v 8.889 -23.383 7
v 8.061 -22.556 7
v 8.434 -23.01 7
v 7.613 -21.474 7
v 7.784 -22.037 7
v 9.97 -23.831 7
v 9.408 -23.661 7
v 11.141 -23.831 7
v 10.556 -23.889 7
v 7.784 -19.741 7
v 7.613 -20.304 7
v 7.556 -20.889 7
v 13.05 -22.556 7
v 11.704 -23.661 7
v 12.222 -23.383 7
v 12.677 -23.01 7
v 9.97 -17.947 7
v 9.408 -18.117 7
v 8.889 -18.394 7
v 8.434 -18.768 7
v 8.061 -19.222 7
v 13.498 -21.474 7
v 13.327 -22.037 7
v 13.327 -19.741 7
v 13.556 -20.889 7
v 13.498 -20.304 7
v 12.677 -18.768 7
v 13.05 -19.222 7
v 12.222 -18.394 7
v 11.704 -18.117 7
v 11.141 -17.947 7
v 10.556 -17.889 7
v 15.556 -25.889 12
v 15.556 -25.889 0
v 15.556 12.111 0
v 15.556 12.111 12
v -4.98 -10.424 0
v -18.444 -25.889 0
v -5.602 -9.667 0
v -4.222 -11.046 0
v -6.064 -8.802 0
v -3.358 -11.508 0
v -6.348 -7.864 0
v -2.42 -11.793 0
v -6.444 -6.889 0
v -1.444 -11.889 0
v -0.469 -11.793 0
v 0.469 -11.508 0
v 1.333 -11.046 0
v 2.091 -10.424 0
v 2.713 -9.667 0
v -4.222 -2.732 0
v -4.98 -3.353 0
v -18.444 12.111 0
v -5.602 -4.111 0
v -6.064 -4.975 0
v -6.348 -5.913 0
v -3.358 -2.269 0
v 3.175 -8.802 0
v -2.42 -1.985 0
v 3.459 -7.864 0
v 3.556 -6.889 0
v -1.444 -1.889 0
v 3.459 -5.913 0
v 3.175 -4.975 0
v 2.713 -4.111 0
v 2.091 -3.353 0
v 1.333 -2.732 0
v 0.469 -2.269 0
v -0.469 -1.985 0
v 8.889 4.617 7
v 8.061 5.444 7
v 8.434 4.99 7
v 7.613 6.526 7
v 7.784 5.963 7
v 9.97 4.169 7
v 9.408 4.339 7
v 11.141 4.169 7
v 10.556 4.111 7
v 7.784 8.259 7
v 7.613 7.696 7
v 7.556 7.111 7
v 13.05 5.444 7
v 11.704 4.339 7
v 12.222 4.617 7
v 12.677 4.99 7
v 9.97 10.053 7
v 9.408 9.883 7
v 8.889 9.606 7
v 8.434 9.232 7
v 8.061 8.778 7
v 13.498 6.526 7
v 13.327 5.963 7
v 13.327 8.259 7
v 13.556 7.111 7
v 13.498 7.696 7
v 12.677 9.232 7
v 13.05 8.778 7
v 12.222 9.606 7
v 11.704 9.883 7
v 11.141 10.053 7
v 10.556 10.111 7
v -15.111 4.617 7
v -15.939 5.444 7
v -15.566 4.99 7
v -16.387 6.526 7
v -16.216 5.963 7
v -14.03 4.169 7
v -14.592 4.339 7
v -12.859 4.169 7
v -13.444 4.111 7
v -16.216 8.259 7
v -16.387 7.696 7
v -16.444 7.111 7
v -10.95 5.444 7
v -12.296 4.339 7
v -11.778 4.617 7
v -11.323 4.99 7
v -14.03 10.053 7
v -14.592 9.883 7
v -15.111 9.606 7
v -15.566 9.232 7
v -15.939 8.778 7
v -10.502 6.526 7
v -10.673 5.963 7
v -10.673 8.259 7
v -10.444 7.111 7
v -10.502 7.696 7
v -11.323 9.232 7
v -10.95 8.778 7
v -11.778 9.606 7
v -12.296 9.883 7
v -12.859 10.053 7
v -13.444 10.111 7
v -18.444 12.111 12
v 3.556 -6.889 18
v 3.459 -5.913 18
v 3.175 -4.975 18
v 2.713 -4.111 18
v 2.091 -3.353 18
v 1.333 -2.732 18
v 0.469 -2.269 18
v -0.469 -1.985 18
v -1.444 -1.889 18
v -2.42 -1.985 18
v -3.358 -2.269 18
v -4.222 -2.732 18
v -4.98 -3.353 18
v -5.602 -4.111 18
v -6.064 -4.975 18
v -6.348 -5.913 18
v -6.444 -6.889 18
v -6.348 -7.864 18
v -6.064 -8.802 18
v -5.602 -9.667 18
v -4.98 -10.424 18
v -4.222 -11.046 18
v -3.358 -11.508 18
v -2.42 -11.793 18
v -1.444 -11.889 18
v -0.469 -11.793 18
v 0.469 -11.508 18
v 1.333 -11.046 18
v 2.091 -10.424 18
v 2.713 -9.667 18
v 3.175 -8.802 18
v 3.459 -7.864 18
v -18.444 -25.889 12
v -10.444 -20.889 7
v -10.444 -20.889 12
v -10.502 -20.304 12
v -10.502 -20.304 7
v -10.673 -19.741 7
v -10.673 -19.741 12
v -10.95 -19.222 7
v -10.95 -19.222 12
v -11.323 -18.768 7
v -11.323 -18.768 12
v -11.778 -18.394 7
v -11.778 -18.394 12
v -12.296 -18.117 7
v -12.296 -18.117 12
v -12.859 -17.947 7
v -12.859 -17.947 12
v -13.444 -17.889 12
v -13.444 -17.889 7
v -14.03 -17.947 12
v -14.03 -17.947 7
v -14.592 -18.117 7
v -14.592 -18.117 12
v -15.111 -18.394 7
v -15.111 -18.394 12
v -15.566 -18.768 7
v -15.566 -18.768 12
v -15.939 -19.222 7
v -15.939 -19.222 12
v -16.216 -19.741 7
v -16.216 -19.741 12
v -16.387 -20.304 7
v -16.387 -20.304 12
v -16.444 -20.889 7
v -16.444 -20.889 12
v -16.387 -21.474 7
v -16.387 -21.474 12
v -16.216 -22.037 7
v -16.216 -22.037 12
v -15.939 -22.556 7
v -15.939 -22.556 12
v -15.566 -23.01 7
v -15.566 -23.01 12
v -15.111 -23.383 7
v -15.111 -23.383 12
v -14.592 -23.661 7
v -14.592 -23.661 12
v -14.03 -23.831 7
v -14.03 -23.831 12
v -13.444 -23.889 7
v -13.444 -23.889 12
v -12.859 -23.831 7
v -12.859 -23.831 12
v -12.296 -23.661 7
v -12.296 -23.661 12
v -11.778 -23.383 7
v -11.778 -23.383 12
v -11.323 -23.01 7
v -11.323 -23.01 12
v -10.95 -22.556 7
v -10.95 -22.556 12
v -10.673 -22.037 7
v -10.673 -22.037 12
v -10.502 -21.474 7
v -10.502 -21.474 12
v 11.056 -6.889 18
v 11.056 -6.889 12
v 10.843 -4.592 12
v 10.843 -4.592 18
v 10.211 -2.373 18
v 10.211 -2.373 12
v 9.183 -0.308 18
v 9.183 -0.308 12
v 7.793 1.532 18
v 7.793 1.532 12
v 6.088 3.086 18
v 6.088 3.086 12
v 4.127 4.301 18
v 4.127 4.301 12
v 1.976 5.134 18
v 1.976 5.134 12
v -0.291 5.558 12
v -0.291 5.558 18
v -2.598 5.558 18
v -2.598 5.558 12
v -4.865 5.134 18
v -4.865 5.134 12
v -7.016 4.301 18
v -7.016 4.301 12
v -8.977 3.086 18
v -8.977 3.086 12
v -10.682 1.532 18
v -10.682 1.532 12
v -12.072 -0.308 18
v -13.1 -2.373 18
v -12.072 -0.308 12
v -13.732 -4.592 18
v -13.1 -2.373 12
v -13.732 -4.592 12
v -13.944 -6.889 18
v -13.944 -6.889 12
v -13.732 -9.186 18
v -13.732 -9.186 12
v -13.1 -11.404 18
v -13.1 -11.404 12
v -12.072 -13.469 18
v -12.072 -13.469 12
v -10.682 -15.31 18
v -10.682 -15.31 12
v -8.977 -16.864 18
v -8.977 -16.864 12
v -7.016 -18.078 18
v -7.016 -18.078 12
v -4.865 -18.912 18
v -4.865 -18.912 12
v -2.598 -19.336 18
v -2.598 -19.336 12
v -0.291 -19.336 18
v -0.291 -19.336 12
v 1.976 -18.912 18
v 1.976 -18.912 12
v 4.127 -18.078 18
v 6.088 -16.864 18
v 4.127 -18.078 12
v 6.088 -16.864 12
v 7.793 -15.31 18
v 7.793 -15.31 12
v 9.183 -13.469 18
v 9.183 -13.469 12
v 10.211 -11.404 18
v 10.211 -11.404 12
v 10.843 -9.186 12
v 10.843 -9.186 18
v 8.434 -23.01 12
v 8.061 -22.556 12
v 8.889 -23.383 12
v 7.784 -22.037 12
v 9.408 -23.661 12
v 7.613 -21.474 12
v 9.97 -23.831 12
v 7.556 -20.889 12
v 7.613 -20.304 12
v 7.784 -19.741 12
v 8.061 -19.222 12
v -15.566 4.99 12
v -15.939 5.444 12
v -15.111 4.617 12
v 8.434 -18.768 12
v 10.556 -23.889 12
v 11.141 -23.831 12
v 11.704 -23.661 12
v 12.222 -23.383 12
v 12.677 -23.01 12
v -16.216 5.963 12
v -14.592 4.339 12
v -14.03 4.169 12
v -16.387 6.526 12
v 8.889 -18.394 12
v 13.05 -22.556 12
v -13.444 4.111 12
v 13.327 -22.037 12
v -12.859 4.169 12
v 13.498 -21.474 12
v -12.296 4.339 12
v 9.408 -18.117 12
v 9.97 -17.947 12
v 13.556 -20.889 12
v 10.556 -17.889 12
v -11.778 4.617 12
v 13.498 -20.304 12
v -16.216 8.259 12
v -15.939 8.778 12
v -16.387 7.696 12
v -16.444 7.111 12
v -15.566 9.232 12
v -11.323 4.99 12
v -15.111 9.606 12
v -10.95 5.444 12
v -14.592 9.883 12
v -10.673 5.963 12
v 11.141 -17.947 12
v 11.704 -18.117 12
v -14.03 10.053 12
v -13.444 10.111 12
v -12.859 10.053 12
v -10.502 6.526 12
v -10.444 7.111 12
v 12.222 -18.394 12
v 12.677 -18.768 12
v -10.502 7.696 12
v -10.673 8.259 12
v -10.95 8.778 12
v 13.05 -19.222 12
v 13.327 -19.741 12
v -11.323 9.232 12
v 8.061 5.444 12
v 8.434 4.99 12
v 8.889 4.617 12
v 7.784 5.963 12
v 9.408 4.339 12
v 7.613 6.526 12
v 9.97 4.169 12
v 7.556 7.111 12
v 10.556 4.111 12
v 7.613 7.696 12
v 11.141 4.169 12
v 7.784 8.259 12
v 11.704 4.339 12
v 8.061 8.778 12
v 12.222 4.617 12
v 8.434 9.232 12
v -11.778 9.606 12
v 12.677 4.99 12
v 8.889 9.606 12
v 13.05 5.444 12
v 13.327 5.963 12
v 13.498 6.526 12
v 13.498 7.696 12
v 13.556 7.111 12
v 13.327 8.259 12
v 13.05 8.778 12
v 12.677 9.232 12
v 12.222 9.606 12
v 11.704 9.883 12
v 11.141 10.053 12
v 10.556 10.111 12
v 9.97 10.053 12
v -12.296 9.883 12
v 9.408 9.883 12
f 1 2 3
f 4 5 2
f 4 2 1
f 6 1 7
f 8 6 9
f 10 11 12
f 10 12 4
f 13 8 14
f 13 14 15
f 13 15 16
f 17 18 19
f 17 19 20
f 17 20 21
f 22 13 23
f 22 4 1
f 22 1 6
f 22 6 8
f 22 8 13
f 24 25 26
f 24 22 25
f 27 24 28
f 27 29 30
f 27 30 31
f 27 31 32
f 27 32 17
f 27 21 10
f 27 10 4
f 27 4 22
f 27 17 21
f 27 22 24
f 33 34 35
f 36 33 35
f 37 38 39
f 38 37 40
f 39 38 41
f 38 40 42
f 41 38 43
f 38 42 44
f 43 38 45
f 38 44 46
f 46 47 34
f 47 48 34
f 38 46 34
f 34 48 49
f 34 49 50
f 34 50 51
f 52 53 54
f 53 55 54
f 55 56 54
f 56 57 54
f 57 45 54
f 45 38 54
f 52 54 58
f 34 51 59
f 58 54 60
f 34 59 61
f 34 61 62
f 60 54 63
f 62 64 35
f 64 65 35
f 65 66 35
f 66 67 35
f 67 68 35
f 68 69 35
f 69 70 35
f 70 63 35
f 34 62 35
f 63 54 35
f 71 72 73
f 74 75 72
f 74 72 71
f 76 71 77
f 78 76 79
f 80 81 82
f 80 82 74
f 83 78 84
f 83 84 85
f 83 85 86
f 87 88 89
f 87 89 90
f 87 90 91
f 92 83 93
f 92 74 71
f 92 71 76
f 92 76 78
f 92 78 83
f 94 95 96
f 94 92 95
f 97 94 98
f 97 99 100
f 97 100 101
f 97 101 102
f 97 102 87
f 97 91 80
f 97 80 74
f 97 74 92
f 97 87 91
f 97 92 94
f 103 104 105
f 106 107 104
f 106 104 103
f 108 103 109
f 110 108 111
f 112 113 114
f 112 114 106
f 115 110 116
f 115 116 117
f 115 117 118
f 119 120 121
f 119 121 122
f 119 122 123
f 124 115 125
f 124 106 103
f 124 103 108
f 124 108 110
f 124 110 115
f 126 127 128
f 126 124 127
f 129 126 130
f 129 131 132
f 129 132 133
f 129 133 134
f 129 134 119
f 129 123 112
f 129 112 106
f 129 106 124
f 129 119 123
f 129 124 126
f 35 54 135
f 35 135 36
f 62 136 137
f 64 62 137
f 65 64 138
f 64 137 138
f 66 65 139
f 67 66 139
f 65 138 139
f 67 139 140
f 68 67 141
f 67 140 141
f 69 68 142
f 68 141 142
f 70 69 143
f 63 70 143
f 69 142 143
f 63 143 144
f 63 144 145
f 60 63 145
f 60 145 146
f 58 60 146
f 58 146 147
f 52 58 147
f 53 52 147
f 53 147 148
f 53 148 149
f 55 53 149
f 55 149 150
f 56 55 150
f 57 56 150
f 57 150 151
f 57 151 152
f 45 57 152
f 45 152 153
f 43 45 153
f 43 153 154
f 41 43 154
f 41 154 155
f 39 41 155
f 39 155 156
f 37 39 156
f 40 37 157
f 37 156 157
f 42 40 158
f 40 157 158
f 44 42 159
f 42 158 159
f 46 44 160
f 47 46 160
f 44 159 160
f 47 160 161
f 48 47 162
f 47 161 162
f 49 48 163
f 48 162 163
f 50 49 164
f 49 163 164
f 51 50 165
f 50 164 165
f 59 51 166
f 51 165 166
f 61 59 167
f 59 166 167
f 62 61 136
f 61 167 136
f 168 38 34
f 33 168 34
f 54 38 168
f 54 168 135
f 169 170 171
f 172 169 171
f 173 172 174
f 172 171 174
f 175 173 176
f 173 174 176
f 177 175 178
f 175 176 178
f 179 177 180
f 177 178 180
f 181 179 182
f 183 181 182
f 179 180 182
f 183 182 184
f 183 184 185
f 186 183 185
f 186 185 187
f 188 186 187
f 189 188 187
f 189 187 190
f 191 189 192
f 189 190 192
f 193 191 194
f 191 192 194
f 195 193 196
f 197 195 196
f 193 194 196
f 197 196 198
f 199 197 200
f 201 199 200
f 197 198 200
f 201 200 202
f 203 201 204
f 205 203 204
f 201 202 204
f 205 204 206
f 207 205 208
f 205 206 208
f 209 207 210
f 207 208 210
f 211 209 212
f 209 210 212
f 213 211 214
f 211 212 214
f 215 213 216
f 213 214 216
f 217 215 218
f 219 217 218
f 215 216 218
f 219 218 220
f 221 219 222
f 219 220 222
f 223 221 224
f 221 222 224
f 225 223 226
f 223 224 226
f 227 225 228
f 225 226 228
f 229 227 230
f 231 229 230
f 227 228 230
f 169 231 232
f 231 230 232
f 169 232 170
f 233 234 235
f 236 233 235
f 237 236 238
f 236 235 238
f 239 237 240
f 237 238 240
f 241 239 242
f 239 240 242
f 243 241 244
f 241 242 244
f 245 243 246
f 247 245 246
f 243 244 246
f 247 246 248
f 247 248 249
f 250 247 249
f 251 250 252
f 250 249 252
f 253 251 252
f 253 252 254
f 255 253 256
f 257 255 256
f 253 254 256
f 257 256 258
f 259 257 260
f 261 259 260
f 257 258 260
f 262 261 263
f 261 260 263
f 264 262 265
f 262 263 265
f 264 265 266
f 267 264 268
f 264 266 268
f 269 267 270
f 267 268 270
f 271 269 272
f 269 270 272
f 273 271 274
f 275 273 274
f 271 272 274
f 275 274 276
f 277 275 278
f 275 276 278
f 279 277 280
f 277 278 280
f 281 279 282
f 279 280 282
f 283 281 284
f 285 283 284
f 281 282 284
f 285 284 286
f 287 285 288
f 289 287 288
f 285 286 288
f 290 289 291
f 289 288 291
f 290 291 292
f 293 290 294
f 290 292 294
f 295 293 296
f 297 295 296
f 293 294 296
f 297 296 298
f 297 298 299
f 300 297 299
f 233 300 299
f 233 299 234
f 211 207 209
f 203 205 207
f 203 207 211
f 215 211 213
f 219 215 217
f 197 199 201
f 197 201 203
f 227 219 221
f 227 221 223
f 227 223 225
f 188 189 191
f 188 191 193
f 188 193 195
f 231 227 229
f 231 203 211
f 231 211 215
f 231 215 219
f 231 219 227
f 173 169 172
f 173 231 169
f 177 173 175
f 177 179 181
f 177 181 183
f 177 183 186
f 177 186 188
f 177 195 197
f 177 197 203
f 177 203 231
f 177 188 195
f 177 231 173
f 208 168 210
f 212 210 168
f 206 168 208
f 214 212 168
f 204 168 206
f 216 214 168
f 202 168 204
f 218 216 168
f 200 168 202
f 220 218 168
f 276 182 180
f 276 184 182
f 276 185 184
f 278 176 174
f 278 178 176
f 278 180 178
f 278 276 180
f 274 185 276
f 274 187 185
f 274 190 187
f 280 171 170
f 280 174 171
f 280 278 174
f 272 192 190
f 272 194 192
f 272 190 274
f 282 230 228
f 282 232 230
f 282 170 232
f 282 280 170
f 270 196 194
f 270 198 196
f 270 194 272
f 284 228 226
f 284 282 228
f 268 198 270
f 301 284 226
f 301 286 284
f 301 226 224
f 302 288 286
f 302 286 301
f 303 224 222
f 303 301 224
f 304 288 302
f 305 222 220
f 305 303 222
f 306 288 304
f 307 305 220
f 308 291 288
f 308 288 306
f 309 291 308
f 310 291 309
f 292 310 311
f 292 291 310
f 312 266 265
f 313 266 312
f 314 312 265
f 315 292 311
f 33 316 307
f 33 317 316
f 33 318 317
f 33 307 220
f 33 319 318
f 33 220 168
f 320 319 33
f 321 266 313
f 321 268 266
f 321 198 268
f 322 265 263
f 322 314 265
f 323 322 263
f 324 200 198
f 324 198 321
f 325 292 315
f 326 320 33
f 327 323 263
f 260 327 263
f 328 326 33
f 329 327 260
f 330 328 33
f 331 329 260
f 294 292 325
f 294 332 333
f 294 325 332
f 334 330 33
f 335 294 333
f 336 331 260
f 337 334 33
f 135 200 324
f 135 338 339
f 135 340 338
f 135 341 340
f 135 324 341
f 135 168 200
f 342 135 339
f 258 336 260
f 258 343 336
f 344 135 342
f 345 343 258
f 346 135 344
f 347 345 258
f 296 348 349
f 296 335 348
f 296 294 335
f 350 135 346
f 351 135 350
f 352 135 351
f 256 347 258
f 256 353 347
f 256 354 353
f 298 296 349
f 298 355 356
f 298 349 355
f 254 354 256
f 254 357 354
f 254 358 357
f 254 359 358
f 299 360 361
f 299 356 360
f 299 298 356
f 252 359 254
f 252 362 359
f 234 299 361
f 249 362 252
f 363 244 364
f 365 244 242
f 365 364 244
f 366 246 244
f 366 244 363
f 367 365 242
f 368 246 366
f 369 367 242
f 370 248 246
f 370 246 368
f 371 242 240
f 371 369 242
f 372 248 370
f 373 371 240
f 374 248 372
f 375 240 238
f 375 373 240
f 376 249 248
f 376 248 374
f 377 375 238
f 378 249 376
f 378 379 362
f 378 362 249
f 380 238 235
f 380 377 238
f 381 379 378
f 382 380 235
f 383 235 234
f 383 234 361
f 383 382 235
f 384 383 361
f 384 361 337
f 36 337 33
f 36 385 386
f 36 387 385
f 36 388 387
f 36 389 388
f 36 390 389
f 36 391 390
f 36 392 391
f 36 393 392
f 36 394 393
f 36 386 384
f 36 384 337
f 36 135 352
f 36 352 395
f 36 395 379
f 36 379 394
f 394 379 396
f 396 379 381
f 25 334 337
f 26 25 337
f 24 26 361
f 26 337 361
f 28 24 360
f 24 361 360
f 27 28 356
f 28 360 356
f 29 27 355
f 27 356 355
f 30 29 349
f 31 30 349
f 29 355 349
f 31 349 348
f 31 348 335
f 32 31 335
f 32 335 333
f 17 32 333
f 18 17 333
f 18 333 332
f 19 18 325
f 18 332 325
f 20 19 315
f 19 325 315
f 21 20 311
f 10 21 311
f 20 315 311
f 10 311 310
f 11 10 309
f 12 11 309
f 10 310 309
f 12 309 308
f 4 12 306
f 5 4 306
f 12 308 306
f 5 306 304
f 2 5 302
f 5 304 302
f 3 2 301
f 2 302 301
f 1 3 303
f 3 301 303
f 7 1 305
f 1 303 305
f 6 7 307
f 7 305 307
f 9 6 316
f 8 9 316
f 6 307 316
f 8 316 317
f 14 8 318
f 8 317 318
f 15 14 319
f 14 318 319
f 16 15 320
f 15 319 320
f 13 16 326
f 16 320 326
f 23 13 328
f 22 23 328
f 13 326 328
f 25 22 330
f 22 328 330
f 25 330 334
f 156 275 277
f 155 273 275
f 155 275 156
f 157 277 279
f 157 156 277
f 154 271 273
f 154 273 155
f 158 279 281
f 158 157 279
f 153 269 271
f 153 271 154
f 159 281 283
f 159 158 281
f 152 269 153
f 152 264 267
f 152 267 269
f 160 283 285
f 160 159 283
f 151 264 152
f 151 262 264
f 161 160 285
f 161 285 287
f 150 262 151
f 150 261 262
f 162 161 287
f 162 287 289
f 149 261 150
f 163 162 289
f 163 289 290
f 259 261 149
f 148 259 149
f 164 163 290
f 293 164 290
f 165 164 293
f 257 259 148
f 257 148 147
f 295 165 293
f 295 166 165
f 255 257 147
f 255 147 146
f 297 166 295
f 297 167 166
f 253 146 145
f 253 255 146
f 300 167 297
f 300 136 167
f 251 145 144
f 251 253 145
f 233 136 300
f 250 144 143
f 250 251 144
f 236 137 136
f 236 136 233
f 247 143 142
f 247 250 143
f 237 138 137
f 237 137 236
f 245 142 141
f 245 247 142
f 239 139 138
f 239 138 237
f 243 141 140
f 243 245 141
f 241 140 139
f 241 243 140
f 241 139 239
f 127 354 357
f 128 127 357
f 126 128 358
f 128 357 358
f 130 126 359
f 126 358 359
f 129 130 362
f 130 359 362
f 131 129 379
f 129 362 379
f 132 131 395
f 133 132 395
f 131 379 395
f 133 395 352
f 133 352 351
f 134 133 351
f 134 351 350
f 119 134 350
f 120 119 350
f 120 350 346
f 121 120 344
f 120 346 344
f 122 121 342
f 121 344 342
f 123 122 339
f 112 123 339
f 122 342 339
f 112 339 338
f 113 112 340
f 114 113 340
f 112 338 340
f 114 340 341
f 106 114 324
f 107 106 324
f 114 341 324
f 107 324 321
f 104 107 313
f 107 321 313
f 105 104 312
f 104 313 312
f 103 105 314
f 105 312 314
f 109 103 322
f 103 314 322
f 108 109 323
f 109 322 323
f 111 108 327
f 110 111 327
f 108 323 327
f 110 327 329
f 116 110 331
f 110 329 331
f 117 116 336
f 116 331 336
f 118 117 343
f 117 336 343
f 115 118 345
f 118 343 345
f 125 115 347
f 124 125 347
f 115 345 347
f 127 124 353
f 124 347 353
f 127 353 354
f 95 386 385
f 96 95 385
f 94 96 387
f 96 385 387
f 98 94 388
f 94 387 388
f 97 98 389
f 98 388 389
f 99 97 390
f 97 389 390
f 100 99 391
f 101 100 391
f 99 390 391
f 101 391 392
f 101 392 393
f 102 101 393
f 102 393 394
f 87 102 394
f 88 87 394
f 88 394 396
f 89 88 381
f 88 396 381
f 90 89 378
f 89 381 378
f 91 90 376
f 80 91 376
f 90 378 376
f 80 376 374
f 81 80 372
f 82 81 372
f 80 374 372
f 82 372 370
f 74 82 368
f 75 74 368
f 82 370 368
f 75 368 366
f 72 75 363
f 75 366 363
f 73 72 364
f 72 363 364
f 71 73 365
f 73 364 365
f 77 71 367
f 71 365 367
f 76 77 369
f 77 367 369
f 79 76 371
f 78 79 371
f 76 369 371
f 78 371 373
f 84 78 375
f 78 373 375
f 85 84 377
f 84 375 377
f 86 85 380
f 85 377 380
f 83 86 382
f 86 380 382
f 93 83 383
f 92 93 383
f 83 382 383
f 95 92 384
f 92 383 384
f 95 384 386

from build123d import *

# Parameters (mm, degrees)
SKETCH1_W            = 34
SKETCH1_H            = 38
BOSS_EXTRUDE1_DEPTH  = 12
SKETCH_1_R           = 12.5
EXTRUDE_1_DEPTH      = 6
SKETCH_2_R           = 5
CUT_EXTRUDE_1_DEPTH  = 100
SKETCH2_R            = 3
CUT_EXTRUDE1_DEPTH   = 5
LPATTERN1_COUNT      = 2
LPATTERN1_PITCH      = 24
LPATTERN1_COUNT_DIR2 = 2
LPATTERN1_PITCH_DIR2 = 28


with BuildPart() as part:
    # Sketch1 → Boss-Extrude1 (new body)
    with BuildSketch(Plane.XY):
        with Locations((-1.444444444, -6.888888889)):
            Rectangle(SKETCH1_W, SKETCH1_H)
    extrude(amount=BOSS_EXTRUDE1_DEPTH)

    # Эскиз1 → Бобышка-Вытянуть1 (add)
    with BuildSketch(Plane.XY.offset(12)):
        with Locations((-1.444444444, -6.888888889)):
            Circle(SKETCH_1_R)
    extrude(amount=EXTRUDE_1_DEPTH)

    # Эскиз2 → Вырез-Вытянуть1 (cut)
    with BuildSketch(Plane.XY.offset(18)):
        with Locations((-1.444444444, -6.888888889)):
            Circle(SKETCH_2_R)
    extrude(amount=-CUT_EXTRUDE_1_DEPTH, mode=Mode.SUBTRACT)

    # Sketch2 → Cut-Extrude1 (cut)
    with BuildSketch(Plane.XY.offset(12)):
        with Locations((-13.444444444, 7.111111111)):
            Circle(SKETCH2_R)
    cut_extrude1 = extrude(amount=-CUT_EXTRUDE1_DEPTH, mode=Mode.SUBTRACT)

    # LPattern1: Cut-Extrude1 2 × 2
    with Locations(*[(i * LPATTERN1_PITCH, -j * LPATTERN1_PITCH_DIR2, 0) for i in range(LPATTERN1_COUNT) for j in range(LPATTERN1_COUNT_DIR2) if (i, j) != (0, 0)]):
        add(cut_extrude1, mode=Mode.SUBTRACT)


solid = part.part
